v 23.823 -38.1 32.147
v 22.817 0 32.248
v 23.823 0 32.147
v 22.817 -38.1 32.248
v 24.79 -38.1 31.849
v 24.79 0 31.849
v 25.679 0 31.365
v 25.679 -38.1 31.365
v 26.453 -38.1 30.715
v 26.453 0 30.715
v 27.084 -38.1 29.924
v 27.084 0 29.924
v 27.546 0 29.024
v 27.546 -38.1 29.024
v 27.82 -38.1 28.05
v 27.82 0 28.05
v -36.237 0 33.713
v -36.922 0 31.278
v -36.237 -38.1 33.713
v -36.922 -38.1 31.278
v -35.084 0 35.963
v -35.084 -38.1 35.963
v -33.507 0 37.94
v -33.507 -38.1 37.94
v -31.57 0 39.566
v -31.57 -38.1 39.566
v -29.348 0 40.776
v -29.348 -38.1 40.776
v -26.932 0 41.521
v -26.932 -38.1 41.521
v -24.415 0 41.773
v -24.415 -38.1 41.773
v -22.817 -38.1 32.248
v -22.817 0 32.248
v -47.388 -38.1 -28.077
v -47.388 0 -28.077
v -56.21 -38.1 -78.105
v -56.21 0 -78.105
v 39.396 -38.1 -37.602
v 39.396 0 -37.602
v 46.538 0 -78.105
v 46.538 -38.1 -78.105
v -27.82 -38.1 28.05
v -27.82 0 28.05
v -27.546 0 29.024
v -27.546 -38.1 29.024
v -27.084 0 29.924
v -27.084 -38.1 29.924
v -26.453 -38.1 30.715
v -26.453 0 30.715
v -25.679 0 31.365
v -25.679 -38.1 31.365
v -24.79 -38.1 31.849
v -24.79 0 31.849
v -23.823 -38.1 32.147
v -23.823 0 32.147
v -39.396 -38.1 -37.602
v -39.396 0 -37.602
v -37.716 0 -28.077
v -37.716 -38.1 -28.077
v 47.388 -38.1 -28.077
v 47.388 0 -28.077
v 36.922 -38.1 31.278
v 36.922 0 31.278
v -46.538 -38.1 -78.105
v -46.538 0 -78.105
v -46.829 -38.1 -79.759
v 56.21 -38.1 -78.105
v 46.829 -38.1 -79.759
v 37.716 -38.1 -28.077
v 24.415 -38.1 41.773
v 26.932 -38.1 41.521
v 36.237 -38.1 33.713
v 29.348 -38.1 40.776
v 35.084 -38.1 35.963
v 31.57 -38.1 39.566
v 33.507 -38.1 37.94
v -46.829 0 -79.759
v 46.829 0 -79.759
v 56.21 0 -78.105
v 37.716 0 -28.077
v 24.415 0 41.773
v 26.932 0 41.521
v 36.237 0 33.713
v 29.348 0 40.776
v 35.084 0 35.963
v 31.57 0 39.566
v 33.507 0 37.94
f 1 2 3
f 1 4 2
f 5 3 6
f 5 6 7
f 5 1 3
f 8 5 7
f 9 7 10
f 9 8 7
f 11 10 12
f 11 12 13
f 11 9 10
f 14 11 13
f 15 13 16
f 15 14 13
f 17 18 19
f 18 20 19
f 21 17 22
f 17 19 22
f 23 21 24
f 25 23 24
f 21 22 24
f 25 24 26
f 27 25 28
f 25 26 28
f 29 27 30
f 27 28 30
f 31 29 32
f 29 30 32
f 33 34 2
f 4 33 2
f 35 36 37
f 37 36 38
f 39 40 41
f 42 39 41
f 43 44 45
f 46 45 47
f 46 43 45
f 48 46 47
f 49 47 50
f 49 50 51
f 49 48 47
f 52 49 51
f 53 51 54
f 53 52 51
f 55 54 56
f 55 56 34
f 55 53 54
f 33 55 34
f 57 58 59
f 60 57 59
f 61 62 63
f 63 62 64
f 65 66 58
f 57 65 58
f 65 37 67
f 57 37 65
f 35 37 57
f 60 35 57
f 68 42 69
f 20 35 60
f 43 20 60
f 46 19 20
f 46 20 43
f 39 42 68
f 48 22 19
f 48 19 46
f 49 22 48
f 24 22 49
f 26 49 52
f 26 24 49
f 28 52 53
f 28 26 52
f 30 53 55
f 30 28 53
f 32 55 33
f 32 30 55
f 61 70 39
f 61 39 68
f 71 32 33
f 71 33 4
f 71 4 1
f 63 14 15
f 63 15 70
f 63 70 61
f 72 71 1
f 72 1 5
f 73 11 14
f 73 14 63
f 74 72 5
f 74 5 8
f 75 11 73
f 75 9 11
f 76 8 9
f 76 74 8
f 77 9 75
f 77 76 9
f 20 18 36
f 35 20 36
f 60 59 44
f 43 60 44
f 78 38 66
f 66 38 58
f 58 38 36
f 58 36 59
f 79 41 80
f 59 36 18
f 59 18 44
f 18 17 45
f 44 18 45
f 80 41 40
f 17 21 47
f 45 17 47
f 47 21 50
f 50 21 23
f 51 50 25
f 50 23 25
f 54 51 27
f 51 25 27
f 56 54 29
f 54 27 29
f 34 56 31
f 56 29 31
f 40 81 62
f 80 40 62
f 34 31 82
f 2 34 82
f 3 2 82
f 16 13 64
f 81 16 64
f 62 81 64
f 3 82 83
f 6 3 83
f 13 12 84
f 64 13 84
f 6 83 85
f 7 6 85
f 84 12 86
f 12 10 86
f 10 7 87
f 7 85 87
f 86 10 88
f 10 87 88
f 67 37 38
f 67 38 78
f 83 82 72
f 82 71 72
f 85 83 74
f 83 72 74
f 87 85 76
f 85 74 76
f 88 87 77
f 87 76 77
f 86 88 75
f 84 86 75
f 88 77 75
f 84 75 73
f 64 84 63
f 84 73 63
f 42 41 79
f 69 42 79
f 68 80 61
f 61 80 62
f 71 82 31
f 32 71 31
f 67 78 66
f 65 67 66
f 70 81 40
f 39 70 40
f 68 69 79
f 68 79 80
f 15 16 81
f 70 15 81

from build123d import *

# Parameters (mm, degrees)
F1_DEPTH = 38.1
F2_R     = 5.08
F3_R     = 12.7


with BuildPart() as f1:
    # F0 (on Front) → F1 (new body)
    with BuildSketch(Plane.XZ):
        Polygon((47.388378, -28.077184), (35.071938, 41.772816), (-35.071938, 41.772816), (-47.388378, -28.077184), (-56.209706, -78.105418), (-46.829412, -79.759417), (-46.537767, -78.105418), (-39.395954, -37.602184), (-37.71644, -28.077184), (-27.079514, 32.247816), (27.079514, 32.247816), (37.71644, -28.077184), (39.395954, -37.602184), (46.537767, -78.105418), (46.829412, -79.759417), (56.209706, -78.105418), align=None)
    extrude(amount=F1_DEPTH)

    # F2
    f2_edges = [f1.edges().sort_by_distance(p)[0] for p in [
        (-27.079514, -19.05, 32.247816),
        (27.079514, -19.05, 32.247816),
    ]]
    fillet(f2_edges, radius=F2_R)

    # F3
    f3_edges = [f1.edges().sort_by_distance(p)[0] for p in [
        (-35.071938, -19.05, 41.772816),
        (35.071938, -19.05, 41.772816),
    ]]
    fillet(f3_edges, radius=F3_R)


solid = f1.part
